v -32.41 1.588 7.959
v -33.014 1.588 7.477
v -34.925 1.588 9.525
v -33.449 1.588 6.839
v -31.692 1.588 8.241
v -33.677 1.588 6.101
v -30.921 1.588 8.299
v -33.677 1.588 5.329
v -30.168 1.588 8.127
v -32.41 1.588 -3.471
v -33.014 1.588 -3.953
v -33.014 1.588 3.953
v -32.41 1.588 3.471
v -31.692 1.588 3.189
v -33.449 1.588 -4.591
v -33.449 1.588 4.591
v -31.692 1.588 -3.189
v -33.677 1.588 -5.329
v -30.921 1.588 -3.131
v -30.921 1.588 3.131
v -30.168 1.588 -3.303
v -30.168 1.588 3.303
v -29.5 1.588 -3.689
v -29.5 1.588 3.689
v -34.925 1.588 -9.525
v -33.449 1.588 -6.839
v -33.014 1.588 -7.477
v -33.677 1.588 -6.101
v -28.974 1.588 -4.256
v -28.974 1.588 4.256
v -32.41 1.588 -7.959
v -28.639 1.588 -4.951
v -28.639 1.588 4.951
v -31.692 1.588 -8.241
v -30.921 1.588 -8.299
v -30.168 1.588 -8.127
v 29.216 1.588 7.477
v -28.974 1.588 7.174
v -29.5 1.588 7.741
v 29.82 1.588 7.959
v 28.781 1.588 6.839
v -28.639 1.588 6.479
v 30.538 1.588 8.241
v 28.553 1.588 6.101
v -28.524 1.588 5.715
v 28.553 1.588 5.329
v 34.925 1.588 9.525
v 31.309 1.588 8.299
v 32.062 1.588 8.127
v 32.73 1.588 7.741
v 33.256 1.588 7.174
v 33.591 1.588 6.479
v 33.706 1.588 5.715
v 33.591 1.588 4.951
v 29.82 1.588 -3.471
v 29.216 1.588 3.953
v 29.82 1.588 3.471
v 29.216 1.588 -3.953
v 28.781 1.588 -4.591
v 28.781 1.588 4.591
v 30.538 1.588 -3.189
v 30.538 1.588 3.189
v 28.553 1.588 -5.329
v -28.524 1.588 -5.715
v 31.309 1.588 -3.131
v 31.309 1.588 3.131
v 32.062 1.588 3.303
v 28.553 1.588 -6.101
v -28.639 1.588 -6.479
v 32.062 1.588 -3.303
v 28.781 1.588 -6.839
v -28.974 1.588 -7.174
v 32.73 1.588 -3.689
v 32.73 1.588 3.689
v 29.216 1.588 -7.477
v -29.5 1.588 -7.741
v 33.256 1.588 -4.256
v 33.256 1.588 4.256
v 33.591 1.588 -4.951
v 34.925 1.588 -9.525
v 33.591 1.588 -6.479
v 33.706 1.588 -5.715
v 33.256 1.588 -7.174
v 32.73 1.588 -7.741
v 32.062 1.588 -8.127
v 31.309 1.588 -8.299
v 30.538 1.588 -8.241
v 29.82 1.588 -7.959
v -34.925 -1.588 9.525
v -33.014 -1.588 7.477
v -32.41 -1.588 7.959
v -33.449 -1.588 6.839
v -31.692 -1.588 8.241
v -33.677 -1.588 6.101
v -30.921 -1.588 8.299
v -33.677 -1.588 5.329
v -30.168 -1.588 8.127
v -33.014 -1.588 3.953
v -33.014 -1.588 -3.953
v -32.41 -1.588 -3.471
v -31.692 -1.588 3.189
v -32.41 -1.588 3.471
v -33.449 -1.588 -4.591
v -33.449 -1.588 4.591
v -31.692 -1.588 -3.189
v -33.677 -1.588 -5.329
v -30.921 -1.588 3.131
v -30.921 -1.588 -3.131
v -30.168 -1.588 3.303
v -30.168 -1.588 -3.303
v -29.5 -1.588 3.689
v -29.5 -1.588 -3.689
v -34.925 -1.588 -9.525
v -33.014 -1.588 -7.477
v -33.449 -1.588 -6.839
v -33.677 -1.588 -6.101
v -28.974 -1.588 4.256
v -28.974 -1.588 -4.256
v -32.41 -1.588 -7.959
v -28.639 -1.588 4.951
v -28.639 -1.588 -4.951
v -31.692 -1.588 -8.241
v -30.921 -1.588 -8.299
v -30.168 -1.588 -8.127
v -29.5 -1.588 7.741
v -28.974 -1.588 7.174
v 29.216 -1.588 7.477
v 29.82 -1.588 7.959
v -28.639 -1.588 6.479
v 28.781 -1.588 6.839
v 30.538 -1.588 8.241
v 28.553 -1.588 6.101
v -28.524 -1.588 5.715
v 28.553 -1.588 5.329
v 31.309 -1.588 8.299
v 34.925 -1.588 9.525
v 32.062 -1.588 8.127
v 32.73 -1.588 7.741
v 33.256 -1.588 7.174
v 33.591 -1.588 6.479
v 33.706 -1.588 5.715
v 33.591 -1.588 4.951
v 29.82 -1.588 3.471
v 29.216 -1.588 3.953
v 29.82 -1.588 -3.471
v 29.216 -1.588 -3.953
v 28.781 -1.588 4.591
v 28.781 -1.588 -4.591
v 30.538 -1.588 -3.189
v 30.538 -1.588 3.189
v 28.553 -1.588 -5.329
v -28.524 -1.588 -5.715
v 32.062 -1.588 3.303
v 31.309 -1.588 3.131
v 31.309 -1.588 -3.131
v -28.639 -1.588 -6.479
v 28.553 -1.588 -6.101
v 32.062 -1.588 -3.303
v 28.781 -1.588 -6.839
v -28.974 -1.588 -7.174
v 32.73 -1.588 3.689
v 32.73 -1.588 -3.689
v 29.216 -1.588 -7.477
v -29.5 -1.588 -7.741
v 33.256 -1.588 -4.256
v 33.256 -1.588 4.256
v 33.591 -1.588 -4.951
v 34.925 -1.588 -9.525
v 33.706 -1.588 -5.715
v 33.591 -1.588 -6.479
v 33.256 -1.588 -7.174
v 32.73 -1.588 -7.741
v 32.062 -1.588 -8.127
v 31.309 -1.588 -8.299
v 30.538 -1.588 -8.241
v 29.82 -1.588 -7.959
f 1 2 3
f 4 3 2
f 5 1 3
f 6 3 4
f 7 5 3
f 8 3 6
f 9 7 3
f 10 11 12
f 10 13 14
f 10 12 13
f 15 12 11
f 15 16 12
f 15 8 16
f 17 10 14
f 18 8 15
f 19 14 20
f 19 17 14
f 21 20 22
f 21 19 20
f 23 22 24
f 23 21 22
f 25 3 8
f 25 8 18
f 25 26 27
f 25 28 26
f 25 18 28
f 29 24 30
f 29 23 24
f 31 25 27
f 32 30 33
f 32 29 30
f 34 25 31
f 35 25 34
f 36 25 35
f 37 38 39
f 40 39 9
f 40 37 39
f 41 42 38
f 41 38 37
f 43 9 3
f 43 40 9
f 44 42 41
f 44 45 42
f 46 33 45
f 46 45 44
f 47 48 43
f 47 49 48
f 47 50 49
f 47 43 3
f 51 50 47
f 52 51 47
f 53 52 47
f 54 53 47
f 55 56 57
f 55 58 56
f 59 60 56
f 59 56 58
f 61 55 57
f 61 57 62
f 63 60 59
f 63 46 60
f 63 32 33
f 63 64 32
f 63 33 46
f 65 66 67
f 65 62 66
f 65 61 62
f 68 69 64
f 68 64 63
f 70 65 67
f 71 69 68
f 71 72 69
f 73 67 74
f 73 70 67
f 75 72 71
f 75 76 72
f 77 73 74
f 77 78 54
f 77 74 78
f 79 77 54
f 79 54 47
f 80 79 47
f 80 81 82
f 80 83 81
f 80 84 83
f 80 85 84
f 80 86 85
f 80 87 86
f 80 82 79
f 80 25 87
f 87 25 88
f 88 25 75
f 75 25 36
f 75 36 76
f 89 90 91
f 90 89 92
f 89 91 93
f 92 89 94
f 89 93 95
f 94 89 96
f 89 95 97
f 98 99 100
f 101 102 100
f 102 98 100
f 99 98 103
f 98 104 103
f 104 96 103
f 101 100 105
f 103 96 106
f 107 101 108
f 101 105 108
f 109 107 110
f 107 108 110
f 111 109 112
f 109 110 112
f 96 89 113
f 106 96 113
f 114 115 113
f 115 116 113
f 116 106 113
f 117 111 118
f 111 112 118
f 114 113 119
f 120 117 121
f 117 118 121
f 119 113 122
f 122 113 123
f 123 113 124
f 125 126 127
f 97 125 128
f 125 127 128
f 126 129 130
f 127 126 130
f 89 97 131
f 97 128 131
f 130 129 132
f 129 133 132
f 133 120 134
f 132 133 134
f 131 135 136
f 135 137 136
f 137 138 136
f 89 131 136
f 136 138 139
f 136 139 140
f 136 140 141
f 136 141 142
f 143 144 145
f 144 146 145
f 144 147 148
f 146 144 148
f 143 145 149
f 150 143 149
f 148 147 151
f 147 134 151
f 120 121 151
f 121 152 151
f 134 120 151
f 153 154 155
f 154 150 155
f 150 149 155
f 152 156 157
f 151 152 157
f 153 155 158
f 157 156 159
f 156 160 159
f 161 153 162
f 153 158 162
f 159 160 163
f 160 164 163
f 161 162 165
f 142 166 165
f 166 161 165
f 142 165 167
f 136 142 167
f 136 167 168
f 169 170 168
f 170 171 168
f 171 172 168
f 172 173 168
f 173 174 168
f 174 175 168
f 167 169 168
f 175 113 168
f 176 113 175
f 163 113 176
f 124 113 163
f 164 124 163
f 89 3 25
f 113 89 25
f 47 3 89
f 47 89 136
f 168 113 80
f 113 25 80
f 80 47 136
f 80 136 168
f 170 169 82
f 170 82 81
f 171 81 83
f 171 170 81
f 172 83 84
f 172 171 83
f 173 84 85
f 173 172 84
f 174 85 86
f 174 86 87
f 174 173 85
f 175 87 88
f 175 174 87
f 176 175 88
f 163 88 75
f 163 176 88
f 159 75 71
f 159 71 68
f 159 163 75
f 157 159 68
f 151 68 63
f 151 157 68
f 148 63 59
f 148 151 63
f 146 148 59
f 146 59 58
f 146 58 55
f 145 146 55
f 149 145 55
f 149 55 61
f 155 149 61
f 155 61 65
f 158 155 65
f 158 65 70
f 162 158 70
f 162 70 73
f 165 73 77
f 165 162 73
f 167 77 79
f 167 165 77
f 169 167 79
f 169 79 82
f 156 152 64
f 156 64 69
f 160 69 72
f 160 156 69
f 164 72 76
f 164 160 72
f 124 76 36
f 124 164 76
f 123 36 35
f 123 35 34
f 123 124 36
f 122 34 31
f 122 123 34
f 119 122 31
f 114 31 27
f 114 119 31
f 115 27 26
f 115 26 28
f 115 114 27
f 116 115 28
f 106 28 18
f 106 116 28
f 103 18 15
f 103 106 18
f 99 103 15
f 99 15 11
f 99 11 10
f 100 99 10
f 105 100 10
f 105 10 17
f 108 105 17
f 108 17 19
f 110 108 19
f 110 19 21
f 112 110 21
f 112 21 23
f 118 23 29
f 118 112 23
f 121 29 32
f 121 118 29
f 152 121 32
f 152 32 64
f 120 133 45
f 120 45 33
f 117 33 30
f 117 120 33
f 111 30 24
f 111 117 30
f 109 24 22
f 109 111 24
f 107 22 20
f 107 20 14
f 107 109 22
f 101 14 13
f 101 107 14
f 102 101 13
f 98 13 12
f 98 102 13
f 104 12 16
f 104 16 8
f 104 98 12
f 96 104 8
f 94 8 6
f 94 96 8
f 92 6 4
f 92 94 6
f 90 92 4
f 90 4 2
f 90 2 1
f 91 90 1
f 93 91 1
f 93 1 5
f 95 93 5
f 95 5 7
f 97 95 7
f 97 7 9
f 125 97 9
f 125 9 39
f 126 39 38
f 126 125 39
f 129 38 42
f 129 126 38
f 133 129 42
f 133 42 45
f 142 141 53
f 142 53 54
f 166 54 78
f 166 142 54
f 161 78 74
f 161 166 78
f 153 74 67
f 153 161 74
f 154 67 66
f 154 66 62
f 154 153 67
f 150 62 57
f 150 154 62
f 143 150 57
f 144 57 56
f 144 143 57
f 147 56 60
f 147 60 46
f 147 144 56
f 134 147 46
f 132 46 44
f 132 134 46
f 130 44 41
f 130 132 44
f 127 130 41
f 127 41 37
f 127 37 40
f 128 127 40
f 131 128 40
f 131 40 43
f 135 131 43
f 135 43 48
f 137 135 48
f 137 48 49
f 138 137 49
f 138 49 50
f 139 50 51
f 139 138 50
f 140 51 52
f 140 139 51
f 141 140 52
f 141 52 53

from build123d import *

# Parameters (mm, degrees)
SKETCH1_W                          = 69.85
SKETCH1_H                          = 19.05
BOSS_EXTRUDE1_DEPTH                = 1.5875
F_6_START                          = -1.5875
F_6_0_204_DIAMETER_HOLE1_OUTLINE_R = 2.5908
F_6_0_204_DIAMETER_HOLE1_DEPTH     = 3.175


# Read off the part's stored shape, not the designer's step: #6 (0.204) Diameter Hole1
with BuildPart() as part:
    # Sketch1 → Boss-Extrude1 (new, symmetric)
    with BuildSketch(Plane(origin=(0, 0, 0), x_dir=(1, 0, 0), z_dir=(0, 1, 0))):
        Rectangle(SKETCH1_W, SKETCH1_H)
    extrude(amount=BOSS_EXTRUDE1_DEPTH, both=True)

    # #6 (0.204) Diameter Hole1 outline → #6 (0.204) Diameter Hole1 (cut)
    with BuildSketch(Plane(origin=(0, 0, 0), x_dir=(1, 0, 0), z_dir=(0, 1, 0)).offset(F_6_START)):
        with Locations((-31.115, -5.715)):
            Circle(F_6_0_204_DIAMETER_HOLE1_OUTLINE_R)
        with Locations((31.115, 5.715)):
            Circle(F_6_0_204_DIAMETER_HOLE1_OUTLINE_R)
        with Locations((31.115, -5.715)):
            Circle(F_6_0_204_DIAMETER_HOLE1_OUTLINE_R)
        with Locations((-31.115, 5.715)):
            Circle(F_6_0_204_DIAMETER_HOLE1_OUTLINE_R)
    extrude(amount=F_6_0_204_DIAMETER_HOLE1_DEPTH, mode=Mode.SUBTRACT)


solid = part.part
